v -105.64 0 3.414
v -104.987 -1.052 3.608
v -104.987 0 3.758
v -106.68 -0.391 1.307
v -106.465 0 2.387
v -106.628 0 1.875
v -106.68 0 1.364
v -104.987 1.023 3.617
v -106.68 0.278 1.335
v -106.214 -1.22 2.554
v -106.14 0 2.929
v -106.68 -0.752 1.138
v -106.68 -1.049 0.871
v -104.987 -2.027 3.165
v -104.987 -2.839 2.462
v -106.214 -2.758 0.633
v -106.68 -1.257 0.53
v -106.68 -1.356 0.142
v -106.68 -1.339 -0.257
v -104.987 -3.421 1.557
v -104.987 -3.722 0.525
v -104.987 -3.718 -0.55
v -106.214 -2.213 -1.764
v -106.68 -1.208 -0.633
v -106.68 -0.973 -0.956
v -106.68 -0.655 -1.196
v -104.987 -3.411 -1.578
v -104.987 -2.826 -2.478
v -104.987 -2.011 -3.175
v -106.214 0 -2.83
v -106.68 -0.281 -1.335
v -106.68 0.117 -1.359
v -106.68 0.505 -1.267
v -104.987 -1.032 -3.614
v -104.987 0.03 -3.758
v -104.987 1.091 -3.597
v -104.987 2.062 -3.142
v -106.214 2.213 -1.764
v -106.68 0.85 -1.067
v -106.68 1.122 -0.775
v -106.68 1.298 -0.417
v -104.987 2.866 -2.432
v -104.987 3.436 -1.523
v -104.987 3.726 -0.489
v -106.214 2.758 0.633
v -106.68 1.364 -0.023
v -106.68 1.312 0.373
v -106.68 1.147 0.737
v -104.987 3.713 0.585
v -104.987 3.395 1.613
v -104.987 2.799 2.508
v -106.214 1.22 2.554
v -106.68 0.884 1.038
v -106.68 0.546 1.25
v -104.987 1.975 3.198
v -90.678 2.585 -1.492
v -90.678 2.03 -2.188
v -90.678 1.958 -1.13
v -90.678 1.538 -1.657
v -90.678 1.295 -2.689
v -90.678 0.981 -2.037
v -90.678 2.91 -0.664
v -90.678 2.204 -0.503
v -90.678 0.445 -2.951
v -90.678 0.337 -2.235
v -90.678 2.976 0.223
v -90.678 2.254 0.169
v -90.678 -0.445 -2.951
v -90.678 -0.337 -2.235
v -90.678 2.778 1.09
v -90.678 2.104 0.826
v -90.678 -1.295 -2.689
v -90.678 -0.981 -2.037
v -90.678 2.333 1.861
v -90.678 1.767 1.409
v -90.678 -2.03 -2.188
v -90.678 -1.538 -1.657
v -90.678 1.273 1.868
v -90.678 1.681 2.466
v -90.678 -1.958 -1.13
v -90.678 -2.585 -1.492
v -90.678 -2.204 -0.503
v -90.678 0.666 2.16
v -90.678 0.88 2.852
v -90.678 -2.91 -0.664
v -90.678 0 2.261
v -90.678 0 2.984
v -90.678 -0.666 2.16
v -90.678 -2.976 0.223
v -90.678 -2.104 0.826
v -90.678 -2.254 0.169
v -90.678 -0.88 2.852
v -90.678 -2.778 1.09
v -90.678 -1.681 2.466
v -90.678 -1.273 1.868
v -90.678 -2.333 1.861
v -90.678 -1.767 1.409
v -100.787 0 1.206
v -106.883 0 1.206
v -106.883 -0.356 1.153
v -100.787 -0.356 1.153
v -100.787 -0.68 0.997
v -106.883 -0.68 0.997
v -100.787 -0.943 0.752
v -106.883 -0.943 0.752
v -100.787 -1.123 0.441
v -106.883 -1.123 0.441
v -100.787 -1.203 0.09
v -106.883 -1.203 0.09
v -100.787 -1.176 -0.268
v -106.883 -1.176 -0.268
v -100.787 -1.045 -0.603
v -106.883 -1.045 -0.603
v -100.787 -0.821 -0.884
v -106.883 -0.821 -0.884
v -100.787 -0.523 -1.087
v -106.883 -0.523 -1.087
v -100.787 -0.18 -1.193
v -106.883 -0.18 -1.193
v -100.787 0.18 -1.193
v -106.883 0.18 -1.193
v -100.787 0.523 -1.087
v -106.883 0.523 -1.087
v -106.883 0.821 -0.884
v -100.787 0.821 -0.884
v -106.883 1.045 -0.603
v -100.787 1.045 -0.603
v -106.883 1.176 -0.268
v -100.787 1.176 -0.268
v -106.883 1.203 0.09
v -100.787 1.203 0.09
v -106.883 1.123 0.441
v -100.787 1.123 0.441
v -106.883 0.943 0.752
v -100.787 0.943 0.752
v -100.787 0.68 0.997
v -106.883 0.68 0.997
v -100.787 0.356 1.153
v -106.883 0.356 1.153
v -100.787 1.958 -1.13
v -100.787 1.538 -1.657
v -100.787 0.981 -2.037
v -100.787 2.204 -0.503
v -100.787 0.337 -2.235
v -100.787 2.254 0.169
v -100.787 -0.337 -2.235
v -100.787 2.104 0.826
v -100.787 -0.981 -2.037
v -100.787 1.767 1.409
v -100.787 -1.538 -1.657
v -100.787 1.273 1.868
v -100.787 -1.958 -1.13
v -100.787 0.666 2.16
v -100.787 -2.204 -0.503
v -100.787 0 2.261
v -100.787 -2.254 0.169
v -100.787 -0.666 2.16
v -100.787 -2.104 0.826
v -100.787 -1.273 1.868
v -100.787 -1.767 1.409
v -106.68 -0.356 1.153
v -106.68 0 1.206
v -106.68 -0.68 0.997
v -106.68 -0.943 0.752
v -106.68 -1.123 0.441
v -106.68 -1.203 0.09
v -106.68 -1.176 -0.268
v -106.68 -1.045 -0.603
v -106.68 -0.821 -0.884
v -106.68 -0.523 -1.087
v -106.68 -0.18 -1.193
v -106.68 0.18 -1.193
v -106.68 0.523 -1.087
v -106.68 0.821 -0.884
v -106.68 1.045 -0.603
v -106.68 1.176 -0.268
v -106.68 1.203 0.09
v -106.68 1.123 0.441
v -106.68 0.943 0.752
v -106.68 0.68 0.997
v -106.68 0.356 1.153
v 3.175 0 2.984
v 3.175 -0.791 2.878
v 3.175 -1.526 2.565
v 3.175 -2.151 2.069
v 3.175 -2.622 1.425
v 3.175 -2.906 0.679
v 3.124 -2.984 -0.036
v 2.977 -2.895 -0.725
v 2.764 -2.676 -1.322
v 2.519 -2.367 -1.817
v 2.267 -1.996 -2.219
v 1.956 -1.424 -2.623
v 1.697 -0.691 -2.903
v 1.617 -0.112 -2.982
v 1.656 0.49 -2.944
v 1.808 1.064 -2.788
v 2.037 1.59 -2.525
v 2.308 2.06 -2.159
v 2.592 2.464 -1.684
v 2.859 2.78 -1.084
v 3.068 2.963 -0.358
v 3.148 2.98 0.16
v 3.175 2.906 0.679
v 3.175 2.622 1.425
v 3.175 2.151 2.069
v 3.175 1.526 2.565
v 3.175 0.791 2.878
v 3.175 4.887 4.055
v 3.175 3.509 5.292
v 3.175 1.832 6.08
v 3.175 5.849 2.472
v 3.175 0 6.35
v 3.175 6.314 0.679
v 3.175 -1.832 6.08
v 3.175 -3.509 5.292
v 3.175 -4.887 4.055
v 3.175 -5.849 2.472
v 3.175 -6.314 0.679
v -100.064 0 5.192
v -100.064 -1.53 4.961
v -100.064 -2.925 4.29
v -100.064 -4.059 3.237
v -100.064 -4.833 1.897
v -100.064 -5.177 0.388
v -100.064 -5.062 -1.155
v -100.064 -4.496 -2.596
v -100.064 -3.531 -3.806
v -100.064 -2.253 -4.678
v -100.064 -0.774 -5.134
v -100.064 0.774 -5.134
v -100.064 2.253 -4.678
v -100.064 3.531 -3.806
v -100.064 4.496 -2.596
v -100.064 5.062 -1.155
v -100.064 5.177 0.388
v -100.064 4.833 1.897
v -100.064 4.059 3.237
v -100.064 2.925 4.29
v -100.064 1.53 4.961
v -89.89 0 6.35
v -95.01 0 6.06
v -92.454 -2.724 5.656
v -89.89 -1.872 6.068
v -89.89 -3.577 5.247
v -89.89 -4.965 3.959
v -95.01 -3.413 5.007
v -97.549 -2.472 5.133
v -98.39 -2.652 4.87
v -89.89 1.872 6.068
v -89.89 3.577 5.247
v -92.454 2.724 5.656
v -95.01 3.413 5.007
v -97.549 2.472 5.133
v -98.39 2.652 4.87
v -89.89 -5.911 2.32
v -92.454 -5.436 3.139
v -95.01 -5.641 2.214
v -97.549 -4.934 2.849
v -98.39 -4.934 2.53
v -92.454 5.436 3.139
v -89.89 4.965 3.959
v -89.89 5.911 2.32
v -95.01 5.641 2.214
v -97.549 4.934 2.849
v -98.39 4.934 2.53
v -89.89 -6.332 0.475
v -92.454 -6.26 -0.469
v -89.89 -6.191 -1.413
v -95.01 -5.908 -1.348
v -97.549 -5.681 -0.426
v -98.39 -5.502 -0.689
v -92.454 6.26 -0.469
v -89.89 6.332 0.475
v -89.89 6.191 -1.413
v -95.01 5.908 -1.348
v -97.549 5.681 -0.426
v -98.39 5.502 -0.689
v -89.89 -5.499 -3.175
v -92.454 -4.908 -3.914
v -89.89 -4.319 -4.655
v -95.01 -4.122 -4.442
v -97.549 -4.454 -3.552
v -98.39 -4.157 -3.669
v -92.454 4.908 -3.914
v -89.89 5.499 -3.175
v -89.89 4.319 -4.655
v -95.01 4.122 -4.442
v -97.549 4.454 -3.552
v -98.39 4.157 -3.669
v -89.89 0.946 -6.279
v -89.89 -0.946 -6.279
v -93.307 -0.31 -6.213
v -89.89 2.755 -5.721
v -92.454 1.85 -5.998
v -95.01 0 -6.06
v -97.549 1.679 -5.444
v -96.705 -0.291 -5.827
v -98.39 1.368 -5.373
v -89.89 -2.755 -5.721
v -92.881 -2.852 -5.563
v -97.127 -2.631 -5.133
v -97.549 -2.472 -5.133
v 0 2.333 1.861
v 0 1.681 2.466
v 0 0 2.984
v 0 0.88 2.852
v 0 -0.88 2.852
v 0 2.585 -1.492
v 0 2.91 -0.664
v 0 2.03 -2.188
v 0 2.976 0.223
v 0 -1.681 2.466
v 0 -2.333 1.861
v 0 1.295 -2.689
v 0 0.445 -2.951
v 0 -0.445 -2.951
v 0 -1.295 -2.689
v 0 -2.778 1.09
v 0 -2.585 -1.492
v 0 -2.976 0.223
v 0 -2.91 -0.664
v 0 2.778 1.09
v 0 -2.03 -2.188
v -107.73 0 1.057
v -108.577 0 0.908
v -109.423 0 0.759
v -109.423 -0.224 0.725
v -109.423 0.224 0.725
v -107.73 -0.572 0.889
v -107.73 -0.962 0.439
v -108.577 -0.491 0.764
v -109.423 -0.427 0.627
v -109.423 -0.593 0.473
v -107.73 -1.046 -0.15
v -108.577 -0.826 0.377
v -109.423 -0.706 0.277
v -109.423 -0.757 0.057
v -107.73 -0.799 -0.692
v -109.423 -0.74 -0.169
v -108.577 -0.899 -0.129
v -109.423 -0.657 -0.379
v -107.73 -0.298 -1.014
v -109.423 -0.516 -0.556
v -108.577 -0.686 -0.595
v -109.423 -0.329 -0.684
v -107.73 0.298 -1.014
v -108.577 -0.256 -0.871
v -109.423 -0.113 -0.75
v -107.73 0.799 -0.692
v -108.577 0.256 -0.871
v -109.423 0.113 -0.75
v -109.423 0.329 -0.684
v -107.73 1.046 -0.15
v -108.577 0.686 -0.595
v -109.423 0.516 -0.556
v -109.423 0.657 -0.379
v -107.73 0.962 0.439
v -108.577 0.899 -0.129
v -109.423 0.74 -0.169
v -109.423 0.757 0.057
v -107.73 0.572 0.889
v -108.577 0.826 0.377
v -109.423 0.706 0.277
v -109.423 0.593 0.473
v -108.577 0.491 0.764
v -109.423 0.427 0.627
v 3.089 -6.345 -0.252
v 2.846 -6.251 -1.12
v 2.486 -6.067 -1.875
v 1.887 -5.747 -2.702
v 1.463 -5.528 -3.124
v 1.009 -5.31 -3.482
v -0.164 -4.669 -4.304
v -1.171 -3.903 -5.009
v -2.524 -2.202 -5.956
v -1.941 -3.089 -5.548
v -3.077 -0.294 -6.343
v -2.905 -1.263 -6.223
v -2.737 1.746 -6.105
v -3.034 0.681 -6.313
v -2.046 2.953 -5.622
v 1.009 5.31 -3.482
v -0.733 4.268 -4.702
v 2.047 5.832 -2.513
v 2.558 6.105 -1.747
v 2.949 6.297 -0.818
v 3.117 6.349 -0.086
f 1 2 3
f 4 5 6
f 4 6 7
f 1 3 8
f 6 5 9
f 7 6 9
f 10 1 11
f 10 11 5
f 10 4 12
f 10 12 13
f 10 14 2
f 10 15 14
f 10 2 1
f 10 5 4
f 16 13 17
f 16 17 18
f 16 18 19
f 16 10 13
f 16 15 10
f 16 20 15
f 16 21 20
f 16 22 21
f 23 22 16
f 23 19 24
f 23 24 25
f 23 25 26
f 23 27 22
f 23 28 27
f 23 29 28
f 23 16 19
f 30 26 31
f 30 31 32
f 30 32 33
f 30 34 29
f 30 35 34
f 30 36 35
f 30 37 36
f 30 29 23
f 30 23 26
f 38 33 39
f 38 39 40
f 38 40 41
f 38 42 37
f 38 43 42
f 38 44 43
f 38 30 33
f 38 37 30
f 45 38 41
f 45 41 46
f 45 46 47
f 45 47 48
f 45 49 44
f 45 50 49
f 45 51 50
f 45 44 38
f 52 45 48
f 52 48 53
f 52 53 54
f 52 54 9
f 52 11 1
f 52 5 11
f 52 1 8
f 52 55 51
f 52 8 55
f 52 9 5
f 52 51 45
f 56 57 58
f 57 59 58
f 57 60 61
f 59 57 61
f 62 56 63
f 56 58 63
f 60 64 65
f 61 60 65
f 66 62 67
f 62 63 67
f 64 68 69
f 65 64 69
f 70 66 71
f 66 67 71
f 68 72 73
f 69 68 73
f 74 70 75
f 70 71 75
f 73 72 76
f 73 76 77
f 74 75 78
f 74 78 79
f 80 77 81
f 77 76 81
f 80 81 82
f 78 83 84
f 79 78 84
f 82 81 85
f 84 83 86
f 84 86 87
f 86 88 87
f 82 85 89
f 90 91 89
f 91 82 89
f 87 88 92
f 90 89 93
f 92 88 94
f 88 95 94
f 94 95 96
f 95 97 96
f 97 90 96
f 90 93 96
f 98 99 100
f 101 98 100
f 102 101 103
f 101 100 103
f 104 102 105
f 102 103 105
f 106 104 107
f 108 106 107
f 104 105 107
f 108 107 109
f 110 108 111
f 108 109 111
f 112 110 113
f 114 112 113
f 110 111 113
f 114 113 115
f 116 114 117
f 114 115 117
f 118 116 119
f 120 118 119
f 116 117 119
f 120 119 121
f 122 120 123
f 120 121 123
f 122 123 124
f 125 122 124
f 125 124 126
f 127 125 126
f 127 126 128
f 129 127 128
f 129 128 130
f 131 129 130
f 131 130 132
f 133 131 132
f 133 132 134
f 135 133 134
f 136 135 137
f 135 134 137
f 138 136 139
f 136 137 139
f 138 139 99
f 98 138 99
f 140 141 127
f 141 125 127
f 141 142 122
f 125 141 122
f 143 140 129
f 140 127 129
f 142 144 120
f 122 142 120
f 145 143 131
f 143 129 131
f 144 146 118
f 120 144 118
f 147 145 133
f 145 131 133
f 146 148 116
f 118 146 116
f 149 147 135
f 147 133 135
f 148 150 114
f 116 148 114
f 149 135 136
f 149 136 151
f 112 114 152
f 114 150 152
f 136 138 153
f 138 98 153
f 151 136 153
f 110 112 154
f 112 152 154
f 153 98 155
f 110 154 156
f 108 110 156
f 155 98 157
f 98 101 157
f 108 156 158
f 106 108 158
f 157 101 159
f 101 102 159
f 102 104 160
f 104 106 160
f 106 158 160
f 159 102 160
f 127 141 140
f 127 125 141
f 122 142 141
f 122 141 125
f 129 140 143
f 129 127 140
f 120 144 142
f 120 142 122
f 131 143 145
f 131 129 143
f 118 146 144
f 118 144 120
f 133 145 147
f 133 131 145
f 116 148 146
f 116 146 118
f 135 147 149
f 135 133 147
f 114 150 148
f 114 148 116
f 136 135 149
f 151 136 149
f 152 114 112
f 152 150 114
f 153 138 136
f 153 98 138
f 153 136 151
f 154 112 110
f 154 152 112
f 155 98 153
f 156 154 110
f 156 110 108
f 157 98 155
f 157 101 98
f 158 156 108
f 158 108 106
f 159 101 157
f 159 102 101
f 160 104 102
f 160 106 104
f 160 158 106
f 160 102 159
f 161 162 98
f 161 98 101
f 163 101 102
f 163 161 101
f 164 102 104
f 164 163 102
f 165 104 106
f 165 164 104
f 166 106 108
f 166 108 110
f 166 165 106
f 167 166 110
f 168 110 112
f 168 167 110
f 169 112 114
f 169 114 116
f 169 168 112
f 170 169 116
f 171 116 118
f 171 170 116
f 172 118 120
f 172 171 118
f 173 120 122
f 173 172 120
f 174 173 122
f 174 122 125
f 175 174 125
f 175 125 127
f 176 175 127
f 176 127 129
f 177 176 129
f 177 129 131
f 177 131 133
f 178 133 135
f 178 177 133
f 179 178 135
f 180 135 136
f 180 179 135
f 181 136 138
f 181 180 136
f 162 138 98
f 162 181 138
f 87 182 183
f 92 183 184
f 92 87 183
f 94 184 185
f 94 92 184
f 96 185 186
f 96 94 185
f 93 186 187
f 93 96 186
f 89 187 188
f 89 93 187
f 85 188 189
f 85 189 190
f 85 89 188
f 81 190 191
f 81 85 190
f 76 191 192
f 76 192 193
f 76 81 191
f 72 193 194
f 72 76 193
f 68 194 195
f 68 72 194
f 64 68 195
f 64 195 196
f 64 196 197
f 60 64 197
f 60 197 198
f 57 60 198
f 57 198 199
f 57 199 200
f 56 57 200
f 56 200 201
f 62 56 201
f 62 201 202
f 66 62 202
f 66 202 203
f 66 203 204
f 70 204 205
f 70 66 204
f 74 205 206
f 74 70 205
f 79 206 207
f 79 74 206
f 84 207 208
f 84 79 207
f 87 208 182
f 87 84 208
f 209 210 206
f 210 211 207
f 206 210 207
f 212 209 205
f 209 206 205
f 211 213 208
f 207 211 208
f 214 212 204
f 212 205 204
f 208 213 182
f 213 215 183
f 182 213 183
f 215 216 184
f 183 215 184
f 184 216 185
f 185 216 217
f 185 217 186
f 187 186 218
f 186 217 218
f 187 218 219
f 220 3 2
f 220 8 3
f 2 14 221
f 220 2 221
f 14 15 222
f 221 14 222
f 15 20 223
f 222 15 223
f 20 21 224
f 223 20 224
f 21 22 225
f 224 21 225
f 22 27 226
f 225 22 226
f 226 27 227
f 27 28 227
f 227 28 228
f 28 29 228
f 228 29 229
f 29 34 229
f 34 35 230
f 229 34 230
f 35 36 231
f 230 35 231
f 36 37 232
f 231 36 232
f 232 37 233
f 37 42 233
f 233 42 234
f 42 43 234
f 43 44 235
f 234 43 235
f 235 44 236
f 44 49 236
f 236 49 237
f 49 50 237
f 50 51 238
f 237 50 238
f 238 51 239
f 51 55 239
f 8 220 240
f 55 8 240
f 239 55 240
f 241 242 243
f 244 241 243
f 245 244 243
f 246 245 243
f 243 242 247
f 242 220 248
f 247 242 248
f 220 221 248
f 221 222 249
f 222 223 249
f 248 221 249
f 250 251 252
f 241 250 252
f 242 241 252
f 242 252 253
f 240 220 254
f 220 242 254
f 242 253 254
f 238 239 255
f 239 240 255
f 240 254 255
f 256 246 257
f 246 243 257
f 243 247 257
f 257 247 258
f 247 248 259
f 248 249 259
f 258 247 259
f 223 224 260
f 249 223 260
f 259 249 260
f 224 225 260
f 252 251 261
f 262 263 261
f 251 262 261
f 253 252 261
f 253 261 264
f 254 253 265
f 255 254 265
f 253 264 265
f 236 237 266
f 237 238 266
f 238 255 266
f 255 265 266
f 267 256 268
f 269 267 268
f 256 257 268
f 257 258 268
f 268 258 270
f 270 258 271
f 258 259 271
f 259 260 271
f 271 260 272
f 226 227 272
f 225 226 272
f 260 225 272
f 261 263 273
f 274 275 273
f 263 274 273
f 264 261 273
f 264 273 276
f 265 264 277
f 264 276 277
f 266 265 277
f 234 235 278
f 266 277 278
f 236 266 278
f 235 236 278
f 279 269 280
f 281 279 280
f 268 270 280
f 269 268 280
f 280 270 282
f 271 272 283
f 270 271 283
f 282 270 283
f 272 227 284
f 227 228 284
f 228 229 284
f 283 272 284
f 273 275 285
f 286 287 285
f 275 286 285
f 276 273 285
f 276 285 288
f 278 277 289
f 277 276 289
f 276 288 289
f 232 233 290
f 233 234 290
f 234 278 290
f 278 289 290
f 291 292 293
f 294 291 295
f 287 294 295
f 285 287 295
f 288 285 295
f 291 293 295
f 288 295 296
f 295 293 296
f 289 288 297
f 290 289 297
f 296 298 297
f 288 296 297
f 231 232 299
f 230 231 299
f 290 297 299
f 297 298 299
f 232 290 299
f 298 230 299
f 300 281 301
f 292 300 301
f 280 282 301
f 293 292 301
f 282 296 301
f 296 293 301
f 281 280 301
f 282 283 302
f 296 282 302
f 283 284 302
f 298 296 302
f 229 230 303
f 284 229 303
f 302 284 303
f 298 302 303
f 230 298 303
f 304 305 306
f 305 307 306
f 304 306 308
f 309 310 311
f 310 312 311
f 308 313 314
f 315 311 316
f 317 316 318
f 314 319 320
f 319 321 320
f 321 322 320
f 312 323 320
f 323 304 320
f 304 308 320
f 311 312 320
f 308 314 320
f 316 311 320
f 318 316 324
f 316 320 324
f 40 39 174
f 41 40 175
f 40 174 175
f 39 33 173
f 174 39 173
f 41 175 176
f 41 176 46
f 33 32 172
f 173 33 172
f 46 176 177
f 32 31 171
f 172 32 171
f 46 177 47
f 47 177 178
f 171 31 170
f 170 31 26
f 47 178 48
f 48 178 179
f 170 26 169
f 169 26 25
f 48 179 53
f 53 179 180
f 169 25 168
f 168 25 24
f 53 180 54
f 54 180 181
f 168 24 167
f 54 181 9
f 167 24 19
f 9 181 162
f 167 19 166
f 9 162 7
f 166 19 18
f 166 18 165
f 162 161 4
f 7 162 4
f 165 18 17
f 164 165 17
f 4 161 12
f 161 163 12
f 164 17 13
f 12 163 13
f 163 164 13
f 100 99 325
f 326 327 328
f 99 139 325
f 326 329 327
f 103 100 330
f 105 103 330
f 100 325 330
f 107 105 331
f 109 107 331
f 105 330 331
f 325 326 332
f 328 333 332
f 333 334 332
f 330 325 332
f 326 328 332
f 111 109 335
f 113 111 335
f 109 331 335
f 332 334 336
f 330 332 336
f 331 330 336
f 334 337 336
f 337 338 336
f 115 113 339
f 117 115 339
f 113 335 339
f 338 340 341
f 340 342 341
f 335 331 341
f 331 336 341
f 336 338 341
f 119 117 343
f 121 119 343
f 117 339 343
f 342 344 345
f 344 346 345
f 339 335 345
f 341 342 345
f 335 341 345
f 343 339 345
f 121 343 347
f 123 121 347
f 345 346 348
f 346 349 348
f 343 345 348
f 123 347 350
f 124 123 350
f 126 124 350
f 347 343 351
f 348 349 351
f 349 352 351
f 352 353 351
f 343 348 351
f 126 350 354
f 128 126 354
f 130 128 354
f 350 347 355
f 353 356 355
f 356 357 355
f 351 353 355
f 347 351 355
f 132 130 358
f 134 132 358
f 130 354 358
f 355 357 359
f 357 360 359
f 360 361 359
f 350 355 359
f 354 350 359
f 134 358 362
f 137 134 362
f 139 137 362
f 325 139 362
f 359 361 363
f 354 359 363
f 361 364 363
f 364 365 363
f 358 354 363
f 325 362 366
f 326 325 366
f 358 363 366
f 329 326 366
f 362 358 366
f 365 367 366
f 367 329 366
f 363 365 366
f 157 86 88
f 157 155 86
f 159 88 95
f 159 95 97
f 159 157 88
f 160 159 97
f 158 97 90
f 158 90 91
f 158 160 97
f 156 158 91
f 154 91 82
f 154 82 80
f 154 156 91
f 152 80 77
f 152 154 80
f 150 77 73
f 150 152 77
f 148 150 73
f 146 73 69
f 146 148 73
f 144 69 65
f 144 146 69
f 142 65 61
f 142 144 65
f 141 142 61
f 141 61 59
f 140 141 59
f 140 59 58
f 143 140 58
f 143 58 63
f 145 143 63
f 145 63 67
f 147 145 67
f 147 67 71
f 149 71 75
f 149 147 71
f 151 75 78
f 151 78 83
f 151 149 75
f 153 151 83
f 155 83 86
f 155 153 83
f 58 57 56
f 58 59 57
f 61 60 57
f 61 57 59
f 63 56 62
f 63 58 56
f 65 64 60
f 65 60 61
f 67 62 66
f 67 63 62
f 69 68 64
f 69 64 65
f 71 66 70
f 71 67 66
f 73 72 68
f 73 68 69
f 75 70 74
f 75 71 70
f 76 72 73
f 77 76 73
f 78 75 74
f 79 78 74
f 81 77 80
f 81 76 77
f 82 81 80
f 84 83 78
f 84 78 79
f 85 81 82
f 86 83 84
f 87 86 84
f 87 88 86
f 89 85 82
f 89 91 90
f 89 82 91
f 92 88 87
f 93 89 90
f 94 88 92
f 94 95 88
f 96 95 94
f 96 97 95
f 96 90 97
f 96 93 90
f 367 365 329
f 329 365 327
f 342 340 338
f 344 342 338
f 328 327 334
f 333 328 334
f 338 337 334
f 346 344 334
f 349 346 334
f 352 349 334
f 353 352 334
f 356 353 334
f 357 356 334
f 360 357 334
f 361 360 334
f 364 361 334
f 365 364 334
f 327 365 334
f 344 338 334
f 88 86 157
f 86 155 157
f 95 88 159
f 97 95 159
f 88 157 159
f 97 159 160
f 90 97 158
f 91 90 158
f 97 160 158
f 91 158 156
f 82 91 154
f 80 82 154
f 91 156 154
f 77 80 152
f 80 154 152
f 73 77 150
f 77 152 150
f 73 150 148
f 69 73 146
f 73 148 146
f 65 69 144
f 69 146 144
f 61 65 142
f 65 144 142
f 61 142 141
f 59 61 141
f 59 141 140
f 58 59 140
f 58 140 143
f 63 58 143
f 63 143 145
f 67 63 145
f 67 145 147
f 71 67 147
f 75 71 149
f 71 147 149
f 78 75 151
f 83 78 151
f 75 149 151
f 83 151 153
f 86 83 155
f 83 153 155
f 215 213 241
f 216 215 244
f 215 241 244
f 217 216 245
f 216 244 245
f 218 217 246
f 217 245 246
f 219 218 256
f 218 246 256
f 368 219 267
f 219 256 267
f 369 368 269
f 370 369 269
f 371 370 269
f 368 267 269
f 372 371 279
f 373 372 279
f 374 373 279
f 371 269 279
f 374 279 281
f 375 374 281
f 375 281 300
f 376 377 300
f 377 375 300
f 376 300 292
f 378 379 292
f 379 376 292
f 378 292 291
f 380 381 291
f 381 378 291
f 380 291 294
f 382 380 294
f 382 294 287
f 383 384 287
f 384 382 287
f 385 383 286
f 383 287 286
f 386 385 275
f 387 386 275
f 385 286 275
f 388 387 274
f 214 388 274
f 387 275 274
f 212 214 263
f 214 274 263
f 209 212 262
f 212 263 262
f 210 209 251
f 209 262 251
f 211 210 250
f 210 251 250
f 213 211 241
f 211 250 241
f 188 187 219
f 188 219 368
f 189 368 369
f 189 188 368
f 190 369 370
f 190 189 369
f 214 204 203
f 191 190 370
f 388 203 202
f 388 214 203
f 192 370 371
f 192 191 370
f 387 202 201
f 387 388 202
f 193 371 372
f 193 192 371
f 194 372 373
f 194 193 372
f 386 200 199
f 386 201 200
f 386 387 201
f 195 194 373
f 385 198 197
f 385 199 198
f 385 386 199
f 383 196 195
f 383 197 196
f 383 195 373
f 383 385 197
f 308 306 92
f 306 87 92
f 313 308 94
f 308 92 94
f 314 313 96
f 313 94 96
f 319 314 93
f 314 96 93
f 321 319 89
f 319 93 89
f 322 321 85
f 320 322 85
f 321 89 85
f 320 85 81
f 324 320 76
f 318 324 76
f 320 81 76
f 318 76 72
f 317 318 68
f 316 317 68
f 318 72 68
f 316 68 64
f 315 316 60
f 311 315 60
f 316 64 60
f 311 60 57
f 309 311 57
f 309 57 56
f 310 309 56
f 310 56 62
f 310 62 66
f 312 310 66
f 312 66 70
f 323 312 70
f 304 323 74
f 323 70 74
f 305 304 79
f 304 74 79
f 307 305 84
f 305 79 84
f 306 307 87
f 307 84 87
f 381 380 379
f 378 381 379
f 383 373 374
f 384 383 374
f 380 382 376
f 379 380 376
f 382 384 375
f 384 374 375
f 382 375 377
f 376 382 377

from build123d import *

# Parameters (mm, degrees)
F5_DEPTH    = 25.4
F7_DEPTH    = 12.7
F8_T1_DEPTH = 17.0147141114
F8_T3_DEPTH = 17.0147141114
F9_SIZE2    = 0.447870531
F9_SIZE     = 2.54
F10_R       = 2.54


# Not quite as in the source:
# - a fillet or chamfer that OpenCascade refuses, or shapes differently, is made with other operations: its cross-section is extruded or revolved along the edge and cut away or added


with BuildPart() as f1:
    # F0 (on Front) → F1 (revolve)
    with BuildSketch(Plane.XZ):
        Polygon((-109.4232, 0), (0, 0), (0, 2.9845), (-90.678, 2.9845), (-90.678, 2.2606), (-100.7872, 2.2606), (-100.7872, 1.5494), (-100.7872, 1.2065), (-109.4232, 1.2065), align=None)
    revolve(axis=Axis((-54.7116, 0, 0), (1, 0, 0)))


with BuildPart() as f3:
    # F2 (on Front) → F3 (revolve)
    with BuildSketch(Plane.XZ):
        with BuildLine():
            Line((0, 6.35), (-89.8901687584, 6.35))
            ThreePointArc((-89.8901687584, 6.35), (-98.4389065262, 5.5354684697), (-106.68, 3.1211865076))
            Line((-106.68, 3.1211865076), (-106.68, 0))
            Line((-106.68, 0), (0, 0))
            Line((0, 0), (3.175, 0))
            Line((3.175, 0), (3.175, 6.35))
            Line((3.175, 6.35), (0, 6.35))
        make_face()
    revolve(axis=Axis((-53.34, 0, 0), (1, 0, 0)))

    # F4: cut F1
    add(f1.part, mode=Mode.SUBTRACT)

    # F5 (cut): a face of the model
    f5_faces = [f1.part.faces().sort_by_distance(p)[0] for p in [
        (0, 0, 0),
    ]]
    extrude(f5_faces, amount=F5_DEPTH, mode=Mode.SUBTRACT)

    # F6 (on Front) → F7 (cut, symmetric)
    with BuildSketch(Plane.XZ):
        Polygon((34.4975971024, 19.9667225742), (-4.445, -7.3011774743), (-4.445, -25.4), (34.4975971024, -25.4), align=None)
    extrude(amount=F7_DEPTH, both=True, mode=Mode.SUBTRACT)

    # F8: fillet of radius 5.08 on 2 edges, made by hand

    # F8_s2 → F8_t1 (cut)
    with BuildSketch(Plane.XZ.offset(-4.3653893316)):
        with BuildLine():
            ThreePointArc((3.175, 0.6788845836), (2.6010150325, -1.6667983716), (1.0087682967, -3.4824078013))
            Line((1.0087682967, -3.4824078013), (3.175, -1.9655960332))
            Line((3.175, -1.9655960332), (3.175, 0.6788845836))
        make_face()
    extrude(amount=F8_T1_DEPTH, mode=Mode.SUBTRACT)

    # F8_s4 → F8_t3 (cut)
    with BuildSketch(Plane.XZ.offset(-12.6493247798)):
        with BuildLine():
            ThreePointArc((3.175, 0.6788845836), (2.6010150325, -1.6667983716), (1.0087682967, -3.4824078013))
            Line((1.0087682967, -3.4824078013), (3.175, -1.9655960332))
            Line((3.175, -1.9655960332), (3.175, 0.6788845836))
        make_face()
    extrude(amount=F8_T3_DEPTH, mode=Mode.SUBTRACT)

    # F10
    f10_edges = [f3.edges().sort_by_distance(p)[0] for p in [
        (-106.68, 0, -3.121187),
    ]]
    fillet(f10_edges, radius=F10_R)


with BuildPart() as f1_1:
    add(f1.part)

    # F9
    f9_edges = [f1_1.edges().sort_by_distance(p)[0] for p in [
        (-109.4232, 0, -1.2065),
    ]]
    chamfer(f9_edges, length=F9_SIZE, length2=F9_SIZE2)


solid = Compound([f3.part, f1_1.part])
